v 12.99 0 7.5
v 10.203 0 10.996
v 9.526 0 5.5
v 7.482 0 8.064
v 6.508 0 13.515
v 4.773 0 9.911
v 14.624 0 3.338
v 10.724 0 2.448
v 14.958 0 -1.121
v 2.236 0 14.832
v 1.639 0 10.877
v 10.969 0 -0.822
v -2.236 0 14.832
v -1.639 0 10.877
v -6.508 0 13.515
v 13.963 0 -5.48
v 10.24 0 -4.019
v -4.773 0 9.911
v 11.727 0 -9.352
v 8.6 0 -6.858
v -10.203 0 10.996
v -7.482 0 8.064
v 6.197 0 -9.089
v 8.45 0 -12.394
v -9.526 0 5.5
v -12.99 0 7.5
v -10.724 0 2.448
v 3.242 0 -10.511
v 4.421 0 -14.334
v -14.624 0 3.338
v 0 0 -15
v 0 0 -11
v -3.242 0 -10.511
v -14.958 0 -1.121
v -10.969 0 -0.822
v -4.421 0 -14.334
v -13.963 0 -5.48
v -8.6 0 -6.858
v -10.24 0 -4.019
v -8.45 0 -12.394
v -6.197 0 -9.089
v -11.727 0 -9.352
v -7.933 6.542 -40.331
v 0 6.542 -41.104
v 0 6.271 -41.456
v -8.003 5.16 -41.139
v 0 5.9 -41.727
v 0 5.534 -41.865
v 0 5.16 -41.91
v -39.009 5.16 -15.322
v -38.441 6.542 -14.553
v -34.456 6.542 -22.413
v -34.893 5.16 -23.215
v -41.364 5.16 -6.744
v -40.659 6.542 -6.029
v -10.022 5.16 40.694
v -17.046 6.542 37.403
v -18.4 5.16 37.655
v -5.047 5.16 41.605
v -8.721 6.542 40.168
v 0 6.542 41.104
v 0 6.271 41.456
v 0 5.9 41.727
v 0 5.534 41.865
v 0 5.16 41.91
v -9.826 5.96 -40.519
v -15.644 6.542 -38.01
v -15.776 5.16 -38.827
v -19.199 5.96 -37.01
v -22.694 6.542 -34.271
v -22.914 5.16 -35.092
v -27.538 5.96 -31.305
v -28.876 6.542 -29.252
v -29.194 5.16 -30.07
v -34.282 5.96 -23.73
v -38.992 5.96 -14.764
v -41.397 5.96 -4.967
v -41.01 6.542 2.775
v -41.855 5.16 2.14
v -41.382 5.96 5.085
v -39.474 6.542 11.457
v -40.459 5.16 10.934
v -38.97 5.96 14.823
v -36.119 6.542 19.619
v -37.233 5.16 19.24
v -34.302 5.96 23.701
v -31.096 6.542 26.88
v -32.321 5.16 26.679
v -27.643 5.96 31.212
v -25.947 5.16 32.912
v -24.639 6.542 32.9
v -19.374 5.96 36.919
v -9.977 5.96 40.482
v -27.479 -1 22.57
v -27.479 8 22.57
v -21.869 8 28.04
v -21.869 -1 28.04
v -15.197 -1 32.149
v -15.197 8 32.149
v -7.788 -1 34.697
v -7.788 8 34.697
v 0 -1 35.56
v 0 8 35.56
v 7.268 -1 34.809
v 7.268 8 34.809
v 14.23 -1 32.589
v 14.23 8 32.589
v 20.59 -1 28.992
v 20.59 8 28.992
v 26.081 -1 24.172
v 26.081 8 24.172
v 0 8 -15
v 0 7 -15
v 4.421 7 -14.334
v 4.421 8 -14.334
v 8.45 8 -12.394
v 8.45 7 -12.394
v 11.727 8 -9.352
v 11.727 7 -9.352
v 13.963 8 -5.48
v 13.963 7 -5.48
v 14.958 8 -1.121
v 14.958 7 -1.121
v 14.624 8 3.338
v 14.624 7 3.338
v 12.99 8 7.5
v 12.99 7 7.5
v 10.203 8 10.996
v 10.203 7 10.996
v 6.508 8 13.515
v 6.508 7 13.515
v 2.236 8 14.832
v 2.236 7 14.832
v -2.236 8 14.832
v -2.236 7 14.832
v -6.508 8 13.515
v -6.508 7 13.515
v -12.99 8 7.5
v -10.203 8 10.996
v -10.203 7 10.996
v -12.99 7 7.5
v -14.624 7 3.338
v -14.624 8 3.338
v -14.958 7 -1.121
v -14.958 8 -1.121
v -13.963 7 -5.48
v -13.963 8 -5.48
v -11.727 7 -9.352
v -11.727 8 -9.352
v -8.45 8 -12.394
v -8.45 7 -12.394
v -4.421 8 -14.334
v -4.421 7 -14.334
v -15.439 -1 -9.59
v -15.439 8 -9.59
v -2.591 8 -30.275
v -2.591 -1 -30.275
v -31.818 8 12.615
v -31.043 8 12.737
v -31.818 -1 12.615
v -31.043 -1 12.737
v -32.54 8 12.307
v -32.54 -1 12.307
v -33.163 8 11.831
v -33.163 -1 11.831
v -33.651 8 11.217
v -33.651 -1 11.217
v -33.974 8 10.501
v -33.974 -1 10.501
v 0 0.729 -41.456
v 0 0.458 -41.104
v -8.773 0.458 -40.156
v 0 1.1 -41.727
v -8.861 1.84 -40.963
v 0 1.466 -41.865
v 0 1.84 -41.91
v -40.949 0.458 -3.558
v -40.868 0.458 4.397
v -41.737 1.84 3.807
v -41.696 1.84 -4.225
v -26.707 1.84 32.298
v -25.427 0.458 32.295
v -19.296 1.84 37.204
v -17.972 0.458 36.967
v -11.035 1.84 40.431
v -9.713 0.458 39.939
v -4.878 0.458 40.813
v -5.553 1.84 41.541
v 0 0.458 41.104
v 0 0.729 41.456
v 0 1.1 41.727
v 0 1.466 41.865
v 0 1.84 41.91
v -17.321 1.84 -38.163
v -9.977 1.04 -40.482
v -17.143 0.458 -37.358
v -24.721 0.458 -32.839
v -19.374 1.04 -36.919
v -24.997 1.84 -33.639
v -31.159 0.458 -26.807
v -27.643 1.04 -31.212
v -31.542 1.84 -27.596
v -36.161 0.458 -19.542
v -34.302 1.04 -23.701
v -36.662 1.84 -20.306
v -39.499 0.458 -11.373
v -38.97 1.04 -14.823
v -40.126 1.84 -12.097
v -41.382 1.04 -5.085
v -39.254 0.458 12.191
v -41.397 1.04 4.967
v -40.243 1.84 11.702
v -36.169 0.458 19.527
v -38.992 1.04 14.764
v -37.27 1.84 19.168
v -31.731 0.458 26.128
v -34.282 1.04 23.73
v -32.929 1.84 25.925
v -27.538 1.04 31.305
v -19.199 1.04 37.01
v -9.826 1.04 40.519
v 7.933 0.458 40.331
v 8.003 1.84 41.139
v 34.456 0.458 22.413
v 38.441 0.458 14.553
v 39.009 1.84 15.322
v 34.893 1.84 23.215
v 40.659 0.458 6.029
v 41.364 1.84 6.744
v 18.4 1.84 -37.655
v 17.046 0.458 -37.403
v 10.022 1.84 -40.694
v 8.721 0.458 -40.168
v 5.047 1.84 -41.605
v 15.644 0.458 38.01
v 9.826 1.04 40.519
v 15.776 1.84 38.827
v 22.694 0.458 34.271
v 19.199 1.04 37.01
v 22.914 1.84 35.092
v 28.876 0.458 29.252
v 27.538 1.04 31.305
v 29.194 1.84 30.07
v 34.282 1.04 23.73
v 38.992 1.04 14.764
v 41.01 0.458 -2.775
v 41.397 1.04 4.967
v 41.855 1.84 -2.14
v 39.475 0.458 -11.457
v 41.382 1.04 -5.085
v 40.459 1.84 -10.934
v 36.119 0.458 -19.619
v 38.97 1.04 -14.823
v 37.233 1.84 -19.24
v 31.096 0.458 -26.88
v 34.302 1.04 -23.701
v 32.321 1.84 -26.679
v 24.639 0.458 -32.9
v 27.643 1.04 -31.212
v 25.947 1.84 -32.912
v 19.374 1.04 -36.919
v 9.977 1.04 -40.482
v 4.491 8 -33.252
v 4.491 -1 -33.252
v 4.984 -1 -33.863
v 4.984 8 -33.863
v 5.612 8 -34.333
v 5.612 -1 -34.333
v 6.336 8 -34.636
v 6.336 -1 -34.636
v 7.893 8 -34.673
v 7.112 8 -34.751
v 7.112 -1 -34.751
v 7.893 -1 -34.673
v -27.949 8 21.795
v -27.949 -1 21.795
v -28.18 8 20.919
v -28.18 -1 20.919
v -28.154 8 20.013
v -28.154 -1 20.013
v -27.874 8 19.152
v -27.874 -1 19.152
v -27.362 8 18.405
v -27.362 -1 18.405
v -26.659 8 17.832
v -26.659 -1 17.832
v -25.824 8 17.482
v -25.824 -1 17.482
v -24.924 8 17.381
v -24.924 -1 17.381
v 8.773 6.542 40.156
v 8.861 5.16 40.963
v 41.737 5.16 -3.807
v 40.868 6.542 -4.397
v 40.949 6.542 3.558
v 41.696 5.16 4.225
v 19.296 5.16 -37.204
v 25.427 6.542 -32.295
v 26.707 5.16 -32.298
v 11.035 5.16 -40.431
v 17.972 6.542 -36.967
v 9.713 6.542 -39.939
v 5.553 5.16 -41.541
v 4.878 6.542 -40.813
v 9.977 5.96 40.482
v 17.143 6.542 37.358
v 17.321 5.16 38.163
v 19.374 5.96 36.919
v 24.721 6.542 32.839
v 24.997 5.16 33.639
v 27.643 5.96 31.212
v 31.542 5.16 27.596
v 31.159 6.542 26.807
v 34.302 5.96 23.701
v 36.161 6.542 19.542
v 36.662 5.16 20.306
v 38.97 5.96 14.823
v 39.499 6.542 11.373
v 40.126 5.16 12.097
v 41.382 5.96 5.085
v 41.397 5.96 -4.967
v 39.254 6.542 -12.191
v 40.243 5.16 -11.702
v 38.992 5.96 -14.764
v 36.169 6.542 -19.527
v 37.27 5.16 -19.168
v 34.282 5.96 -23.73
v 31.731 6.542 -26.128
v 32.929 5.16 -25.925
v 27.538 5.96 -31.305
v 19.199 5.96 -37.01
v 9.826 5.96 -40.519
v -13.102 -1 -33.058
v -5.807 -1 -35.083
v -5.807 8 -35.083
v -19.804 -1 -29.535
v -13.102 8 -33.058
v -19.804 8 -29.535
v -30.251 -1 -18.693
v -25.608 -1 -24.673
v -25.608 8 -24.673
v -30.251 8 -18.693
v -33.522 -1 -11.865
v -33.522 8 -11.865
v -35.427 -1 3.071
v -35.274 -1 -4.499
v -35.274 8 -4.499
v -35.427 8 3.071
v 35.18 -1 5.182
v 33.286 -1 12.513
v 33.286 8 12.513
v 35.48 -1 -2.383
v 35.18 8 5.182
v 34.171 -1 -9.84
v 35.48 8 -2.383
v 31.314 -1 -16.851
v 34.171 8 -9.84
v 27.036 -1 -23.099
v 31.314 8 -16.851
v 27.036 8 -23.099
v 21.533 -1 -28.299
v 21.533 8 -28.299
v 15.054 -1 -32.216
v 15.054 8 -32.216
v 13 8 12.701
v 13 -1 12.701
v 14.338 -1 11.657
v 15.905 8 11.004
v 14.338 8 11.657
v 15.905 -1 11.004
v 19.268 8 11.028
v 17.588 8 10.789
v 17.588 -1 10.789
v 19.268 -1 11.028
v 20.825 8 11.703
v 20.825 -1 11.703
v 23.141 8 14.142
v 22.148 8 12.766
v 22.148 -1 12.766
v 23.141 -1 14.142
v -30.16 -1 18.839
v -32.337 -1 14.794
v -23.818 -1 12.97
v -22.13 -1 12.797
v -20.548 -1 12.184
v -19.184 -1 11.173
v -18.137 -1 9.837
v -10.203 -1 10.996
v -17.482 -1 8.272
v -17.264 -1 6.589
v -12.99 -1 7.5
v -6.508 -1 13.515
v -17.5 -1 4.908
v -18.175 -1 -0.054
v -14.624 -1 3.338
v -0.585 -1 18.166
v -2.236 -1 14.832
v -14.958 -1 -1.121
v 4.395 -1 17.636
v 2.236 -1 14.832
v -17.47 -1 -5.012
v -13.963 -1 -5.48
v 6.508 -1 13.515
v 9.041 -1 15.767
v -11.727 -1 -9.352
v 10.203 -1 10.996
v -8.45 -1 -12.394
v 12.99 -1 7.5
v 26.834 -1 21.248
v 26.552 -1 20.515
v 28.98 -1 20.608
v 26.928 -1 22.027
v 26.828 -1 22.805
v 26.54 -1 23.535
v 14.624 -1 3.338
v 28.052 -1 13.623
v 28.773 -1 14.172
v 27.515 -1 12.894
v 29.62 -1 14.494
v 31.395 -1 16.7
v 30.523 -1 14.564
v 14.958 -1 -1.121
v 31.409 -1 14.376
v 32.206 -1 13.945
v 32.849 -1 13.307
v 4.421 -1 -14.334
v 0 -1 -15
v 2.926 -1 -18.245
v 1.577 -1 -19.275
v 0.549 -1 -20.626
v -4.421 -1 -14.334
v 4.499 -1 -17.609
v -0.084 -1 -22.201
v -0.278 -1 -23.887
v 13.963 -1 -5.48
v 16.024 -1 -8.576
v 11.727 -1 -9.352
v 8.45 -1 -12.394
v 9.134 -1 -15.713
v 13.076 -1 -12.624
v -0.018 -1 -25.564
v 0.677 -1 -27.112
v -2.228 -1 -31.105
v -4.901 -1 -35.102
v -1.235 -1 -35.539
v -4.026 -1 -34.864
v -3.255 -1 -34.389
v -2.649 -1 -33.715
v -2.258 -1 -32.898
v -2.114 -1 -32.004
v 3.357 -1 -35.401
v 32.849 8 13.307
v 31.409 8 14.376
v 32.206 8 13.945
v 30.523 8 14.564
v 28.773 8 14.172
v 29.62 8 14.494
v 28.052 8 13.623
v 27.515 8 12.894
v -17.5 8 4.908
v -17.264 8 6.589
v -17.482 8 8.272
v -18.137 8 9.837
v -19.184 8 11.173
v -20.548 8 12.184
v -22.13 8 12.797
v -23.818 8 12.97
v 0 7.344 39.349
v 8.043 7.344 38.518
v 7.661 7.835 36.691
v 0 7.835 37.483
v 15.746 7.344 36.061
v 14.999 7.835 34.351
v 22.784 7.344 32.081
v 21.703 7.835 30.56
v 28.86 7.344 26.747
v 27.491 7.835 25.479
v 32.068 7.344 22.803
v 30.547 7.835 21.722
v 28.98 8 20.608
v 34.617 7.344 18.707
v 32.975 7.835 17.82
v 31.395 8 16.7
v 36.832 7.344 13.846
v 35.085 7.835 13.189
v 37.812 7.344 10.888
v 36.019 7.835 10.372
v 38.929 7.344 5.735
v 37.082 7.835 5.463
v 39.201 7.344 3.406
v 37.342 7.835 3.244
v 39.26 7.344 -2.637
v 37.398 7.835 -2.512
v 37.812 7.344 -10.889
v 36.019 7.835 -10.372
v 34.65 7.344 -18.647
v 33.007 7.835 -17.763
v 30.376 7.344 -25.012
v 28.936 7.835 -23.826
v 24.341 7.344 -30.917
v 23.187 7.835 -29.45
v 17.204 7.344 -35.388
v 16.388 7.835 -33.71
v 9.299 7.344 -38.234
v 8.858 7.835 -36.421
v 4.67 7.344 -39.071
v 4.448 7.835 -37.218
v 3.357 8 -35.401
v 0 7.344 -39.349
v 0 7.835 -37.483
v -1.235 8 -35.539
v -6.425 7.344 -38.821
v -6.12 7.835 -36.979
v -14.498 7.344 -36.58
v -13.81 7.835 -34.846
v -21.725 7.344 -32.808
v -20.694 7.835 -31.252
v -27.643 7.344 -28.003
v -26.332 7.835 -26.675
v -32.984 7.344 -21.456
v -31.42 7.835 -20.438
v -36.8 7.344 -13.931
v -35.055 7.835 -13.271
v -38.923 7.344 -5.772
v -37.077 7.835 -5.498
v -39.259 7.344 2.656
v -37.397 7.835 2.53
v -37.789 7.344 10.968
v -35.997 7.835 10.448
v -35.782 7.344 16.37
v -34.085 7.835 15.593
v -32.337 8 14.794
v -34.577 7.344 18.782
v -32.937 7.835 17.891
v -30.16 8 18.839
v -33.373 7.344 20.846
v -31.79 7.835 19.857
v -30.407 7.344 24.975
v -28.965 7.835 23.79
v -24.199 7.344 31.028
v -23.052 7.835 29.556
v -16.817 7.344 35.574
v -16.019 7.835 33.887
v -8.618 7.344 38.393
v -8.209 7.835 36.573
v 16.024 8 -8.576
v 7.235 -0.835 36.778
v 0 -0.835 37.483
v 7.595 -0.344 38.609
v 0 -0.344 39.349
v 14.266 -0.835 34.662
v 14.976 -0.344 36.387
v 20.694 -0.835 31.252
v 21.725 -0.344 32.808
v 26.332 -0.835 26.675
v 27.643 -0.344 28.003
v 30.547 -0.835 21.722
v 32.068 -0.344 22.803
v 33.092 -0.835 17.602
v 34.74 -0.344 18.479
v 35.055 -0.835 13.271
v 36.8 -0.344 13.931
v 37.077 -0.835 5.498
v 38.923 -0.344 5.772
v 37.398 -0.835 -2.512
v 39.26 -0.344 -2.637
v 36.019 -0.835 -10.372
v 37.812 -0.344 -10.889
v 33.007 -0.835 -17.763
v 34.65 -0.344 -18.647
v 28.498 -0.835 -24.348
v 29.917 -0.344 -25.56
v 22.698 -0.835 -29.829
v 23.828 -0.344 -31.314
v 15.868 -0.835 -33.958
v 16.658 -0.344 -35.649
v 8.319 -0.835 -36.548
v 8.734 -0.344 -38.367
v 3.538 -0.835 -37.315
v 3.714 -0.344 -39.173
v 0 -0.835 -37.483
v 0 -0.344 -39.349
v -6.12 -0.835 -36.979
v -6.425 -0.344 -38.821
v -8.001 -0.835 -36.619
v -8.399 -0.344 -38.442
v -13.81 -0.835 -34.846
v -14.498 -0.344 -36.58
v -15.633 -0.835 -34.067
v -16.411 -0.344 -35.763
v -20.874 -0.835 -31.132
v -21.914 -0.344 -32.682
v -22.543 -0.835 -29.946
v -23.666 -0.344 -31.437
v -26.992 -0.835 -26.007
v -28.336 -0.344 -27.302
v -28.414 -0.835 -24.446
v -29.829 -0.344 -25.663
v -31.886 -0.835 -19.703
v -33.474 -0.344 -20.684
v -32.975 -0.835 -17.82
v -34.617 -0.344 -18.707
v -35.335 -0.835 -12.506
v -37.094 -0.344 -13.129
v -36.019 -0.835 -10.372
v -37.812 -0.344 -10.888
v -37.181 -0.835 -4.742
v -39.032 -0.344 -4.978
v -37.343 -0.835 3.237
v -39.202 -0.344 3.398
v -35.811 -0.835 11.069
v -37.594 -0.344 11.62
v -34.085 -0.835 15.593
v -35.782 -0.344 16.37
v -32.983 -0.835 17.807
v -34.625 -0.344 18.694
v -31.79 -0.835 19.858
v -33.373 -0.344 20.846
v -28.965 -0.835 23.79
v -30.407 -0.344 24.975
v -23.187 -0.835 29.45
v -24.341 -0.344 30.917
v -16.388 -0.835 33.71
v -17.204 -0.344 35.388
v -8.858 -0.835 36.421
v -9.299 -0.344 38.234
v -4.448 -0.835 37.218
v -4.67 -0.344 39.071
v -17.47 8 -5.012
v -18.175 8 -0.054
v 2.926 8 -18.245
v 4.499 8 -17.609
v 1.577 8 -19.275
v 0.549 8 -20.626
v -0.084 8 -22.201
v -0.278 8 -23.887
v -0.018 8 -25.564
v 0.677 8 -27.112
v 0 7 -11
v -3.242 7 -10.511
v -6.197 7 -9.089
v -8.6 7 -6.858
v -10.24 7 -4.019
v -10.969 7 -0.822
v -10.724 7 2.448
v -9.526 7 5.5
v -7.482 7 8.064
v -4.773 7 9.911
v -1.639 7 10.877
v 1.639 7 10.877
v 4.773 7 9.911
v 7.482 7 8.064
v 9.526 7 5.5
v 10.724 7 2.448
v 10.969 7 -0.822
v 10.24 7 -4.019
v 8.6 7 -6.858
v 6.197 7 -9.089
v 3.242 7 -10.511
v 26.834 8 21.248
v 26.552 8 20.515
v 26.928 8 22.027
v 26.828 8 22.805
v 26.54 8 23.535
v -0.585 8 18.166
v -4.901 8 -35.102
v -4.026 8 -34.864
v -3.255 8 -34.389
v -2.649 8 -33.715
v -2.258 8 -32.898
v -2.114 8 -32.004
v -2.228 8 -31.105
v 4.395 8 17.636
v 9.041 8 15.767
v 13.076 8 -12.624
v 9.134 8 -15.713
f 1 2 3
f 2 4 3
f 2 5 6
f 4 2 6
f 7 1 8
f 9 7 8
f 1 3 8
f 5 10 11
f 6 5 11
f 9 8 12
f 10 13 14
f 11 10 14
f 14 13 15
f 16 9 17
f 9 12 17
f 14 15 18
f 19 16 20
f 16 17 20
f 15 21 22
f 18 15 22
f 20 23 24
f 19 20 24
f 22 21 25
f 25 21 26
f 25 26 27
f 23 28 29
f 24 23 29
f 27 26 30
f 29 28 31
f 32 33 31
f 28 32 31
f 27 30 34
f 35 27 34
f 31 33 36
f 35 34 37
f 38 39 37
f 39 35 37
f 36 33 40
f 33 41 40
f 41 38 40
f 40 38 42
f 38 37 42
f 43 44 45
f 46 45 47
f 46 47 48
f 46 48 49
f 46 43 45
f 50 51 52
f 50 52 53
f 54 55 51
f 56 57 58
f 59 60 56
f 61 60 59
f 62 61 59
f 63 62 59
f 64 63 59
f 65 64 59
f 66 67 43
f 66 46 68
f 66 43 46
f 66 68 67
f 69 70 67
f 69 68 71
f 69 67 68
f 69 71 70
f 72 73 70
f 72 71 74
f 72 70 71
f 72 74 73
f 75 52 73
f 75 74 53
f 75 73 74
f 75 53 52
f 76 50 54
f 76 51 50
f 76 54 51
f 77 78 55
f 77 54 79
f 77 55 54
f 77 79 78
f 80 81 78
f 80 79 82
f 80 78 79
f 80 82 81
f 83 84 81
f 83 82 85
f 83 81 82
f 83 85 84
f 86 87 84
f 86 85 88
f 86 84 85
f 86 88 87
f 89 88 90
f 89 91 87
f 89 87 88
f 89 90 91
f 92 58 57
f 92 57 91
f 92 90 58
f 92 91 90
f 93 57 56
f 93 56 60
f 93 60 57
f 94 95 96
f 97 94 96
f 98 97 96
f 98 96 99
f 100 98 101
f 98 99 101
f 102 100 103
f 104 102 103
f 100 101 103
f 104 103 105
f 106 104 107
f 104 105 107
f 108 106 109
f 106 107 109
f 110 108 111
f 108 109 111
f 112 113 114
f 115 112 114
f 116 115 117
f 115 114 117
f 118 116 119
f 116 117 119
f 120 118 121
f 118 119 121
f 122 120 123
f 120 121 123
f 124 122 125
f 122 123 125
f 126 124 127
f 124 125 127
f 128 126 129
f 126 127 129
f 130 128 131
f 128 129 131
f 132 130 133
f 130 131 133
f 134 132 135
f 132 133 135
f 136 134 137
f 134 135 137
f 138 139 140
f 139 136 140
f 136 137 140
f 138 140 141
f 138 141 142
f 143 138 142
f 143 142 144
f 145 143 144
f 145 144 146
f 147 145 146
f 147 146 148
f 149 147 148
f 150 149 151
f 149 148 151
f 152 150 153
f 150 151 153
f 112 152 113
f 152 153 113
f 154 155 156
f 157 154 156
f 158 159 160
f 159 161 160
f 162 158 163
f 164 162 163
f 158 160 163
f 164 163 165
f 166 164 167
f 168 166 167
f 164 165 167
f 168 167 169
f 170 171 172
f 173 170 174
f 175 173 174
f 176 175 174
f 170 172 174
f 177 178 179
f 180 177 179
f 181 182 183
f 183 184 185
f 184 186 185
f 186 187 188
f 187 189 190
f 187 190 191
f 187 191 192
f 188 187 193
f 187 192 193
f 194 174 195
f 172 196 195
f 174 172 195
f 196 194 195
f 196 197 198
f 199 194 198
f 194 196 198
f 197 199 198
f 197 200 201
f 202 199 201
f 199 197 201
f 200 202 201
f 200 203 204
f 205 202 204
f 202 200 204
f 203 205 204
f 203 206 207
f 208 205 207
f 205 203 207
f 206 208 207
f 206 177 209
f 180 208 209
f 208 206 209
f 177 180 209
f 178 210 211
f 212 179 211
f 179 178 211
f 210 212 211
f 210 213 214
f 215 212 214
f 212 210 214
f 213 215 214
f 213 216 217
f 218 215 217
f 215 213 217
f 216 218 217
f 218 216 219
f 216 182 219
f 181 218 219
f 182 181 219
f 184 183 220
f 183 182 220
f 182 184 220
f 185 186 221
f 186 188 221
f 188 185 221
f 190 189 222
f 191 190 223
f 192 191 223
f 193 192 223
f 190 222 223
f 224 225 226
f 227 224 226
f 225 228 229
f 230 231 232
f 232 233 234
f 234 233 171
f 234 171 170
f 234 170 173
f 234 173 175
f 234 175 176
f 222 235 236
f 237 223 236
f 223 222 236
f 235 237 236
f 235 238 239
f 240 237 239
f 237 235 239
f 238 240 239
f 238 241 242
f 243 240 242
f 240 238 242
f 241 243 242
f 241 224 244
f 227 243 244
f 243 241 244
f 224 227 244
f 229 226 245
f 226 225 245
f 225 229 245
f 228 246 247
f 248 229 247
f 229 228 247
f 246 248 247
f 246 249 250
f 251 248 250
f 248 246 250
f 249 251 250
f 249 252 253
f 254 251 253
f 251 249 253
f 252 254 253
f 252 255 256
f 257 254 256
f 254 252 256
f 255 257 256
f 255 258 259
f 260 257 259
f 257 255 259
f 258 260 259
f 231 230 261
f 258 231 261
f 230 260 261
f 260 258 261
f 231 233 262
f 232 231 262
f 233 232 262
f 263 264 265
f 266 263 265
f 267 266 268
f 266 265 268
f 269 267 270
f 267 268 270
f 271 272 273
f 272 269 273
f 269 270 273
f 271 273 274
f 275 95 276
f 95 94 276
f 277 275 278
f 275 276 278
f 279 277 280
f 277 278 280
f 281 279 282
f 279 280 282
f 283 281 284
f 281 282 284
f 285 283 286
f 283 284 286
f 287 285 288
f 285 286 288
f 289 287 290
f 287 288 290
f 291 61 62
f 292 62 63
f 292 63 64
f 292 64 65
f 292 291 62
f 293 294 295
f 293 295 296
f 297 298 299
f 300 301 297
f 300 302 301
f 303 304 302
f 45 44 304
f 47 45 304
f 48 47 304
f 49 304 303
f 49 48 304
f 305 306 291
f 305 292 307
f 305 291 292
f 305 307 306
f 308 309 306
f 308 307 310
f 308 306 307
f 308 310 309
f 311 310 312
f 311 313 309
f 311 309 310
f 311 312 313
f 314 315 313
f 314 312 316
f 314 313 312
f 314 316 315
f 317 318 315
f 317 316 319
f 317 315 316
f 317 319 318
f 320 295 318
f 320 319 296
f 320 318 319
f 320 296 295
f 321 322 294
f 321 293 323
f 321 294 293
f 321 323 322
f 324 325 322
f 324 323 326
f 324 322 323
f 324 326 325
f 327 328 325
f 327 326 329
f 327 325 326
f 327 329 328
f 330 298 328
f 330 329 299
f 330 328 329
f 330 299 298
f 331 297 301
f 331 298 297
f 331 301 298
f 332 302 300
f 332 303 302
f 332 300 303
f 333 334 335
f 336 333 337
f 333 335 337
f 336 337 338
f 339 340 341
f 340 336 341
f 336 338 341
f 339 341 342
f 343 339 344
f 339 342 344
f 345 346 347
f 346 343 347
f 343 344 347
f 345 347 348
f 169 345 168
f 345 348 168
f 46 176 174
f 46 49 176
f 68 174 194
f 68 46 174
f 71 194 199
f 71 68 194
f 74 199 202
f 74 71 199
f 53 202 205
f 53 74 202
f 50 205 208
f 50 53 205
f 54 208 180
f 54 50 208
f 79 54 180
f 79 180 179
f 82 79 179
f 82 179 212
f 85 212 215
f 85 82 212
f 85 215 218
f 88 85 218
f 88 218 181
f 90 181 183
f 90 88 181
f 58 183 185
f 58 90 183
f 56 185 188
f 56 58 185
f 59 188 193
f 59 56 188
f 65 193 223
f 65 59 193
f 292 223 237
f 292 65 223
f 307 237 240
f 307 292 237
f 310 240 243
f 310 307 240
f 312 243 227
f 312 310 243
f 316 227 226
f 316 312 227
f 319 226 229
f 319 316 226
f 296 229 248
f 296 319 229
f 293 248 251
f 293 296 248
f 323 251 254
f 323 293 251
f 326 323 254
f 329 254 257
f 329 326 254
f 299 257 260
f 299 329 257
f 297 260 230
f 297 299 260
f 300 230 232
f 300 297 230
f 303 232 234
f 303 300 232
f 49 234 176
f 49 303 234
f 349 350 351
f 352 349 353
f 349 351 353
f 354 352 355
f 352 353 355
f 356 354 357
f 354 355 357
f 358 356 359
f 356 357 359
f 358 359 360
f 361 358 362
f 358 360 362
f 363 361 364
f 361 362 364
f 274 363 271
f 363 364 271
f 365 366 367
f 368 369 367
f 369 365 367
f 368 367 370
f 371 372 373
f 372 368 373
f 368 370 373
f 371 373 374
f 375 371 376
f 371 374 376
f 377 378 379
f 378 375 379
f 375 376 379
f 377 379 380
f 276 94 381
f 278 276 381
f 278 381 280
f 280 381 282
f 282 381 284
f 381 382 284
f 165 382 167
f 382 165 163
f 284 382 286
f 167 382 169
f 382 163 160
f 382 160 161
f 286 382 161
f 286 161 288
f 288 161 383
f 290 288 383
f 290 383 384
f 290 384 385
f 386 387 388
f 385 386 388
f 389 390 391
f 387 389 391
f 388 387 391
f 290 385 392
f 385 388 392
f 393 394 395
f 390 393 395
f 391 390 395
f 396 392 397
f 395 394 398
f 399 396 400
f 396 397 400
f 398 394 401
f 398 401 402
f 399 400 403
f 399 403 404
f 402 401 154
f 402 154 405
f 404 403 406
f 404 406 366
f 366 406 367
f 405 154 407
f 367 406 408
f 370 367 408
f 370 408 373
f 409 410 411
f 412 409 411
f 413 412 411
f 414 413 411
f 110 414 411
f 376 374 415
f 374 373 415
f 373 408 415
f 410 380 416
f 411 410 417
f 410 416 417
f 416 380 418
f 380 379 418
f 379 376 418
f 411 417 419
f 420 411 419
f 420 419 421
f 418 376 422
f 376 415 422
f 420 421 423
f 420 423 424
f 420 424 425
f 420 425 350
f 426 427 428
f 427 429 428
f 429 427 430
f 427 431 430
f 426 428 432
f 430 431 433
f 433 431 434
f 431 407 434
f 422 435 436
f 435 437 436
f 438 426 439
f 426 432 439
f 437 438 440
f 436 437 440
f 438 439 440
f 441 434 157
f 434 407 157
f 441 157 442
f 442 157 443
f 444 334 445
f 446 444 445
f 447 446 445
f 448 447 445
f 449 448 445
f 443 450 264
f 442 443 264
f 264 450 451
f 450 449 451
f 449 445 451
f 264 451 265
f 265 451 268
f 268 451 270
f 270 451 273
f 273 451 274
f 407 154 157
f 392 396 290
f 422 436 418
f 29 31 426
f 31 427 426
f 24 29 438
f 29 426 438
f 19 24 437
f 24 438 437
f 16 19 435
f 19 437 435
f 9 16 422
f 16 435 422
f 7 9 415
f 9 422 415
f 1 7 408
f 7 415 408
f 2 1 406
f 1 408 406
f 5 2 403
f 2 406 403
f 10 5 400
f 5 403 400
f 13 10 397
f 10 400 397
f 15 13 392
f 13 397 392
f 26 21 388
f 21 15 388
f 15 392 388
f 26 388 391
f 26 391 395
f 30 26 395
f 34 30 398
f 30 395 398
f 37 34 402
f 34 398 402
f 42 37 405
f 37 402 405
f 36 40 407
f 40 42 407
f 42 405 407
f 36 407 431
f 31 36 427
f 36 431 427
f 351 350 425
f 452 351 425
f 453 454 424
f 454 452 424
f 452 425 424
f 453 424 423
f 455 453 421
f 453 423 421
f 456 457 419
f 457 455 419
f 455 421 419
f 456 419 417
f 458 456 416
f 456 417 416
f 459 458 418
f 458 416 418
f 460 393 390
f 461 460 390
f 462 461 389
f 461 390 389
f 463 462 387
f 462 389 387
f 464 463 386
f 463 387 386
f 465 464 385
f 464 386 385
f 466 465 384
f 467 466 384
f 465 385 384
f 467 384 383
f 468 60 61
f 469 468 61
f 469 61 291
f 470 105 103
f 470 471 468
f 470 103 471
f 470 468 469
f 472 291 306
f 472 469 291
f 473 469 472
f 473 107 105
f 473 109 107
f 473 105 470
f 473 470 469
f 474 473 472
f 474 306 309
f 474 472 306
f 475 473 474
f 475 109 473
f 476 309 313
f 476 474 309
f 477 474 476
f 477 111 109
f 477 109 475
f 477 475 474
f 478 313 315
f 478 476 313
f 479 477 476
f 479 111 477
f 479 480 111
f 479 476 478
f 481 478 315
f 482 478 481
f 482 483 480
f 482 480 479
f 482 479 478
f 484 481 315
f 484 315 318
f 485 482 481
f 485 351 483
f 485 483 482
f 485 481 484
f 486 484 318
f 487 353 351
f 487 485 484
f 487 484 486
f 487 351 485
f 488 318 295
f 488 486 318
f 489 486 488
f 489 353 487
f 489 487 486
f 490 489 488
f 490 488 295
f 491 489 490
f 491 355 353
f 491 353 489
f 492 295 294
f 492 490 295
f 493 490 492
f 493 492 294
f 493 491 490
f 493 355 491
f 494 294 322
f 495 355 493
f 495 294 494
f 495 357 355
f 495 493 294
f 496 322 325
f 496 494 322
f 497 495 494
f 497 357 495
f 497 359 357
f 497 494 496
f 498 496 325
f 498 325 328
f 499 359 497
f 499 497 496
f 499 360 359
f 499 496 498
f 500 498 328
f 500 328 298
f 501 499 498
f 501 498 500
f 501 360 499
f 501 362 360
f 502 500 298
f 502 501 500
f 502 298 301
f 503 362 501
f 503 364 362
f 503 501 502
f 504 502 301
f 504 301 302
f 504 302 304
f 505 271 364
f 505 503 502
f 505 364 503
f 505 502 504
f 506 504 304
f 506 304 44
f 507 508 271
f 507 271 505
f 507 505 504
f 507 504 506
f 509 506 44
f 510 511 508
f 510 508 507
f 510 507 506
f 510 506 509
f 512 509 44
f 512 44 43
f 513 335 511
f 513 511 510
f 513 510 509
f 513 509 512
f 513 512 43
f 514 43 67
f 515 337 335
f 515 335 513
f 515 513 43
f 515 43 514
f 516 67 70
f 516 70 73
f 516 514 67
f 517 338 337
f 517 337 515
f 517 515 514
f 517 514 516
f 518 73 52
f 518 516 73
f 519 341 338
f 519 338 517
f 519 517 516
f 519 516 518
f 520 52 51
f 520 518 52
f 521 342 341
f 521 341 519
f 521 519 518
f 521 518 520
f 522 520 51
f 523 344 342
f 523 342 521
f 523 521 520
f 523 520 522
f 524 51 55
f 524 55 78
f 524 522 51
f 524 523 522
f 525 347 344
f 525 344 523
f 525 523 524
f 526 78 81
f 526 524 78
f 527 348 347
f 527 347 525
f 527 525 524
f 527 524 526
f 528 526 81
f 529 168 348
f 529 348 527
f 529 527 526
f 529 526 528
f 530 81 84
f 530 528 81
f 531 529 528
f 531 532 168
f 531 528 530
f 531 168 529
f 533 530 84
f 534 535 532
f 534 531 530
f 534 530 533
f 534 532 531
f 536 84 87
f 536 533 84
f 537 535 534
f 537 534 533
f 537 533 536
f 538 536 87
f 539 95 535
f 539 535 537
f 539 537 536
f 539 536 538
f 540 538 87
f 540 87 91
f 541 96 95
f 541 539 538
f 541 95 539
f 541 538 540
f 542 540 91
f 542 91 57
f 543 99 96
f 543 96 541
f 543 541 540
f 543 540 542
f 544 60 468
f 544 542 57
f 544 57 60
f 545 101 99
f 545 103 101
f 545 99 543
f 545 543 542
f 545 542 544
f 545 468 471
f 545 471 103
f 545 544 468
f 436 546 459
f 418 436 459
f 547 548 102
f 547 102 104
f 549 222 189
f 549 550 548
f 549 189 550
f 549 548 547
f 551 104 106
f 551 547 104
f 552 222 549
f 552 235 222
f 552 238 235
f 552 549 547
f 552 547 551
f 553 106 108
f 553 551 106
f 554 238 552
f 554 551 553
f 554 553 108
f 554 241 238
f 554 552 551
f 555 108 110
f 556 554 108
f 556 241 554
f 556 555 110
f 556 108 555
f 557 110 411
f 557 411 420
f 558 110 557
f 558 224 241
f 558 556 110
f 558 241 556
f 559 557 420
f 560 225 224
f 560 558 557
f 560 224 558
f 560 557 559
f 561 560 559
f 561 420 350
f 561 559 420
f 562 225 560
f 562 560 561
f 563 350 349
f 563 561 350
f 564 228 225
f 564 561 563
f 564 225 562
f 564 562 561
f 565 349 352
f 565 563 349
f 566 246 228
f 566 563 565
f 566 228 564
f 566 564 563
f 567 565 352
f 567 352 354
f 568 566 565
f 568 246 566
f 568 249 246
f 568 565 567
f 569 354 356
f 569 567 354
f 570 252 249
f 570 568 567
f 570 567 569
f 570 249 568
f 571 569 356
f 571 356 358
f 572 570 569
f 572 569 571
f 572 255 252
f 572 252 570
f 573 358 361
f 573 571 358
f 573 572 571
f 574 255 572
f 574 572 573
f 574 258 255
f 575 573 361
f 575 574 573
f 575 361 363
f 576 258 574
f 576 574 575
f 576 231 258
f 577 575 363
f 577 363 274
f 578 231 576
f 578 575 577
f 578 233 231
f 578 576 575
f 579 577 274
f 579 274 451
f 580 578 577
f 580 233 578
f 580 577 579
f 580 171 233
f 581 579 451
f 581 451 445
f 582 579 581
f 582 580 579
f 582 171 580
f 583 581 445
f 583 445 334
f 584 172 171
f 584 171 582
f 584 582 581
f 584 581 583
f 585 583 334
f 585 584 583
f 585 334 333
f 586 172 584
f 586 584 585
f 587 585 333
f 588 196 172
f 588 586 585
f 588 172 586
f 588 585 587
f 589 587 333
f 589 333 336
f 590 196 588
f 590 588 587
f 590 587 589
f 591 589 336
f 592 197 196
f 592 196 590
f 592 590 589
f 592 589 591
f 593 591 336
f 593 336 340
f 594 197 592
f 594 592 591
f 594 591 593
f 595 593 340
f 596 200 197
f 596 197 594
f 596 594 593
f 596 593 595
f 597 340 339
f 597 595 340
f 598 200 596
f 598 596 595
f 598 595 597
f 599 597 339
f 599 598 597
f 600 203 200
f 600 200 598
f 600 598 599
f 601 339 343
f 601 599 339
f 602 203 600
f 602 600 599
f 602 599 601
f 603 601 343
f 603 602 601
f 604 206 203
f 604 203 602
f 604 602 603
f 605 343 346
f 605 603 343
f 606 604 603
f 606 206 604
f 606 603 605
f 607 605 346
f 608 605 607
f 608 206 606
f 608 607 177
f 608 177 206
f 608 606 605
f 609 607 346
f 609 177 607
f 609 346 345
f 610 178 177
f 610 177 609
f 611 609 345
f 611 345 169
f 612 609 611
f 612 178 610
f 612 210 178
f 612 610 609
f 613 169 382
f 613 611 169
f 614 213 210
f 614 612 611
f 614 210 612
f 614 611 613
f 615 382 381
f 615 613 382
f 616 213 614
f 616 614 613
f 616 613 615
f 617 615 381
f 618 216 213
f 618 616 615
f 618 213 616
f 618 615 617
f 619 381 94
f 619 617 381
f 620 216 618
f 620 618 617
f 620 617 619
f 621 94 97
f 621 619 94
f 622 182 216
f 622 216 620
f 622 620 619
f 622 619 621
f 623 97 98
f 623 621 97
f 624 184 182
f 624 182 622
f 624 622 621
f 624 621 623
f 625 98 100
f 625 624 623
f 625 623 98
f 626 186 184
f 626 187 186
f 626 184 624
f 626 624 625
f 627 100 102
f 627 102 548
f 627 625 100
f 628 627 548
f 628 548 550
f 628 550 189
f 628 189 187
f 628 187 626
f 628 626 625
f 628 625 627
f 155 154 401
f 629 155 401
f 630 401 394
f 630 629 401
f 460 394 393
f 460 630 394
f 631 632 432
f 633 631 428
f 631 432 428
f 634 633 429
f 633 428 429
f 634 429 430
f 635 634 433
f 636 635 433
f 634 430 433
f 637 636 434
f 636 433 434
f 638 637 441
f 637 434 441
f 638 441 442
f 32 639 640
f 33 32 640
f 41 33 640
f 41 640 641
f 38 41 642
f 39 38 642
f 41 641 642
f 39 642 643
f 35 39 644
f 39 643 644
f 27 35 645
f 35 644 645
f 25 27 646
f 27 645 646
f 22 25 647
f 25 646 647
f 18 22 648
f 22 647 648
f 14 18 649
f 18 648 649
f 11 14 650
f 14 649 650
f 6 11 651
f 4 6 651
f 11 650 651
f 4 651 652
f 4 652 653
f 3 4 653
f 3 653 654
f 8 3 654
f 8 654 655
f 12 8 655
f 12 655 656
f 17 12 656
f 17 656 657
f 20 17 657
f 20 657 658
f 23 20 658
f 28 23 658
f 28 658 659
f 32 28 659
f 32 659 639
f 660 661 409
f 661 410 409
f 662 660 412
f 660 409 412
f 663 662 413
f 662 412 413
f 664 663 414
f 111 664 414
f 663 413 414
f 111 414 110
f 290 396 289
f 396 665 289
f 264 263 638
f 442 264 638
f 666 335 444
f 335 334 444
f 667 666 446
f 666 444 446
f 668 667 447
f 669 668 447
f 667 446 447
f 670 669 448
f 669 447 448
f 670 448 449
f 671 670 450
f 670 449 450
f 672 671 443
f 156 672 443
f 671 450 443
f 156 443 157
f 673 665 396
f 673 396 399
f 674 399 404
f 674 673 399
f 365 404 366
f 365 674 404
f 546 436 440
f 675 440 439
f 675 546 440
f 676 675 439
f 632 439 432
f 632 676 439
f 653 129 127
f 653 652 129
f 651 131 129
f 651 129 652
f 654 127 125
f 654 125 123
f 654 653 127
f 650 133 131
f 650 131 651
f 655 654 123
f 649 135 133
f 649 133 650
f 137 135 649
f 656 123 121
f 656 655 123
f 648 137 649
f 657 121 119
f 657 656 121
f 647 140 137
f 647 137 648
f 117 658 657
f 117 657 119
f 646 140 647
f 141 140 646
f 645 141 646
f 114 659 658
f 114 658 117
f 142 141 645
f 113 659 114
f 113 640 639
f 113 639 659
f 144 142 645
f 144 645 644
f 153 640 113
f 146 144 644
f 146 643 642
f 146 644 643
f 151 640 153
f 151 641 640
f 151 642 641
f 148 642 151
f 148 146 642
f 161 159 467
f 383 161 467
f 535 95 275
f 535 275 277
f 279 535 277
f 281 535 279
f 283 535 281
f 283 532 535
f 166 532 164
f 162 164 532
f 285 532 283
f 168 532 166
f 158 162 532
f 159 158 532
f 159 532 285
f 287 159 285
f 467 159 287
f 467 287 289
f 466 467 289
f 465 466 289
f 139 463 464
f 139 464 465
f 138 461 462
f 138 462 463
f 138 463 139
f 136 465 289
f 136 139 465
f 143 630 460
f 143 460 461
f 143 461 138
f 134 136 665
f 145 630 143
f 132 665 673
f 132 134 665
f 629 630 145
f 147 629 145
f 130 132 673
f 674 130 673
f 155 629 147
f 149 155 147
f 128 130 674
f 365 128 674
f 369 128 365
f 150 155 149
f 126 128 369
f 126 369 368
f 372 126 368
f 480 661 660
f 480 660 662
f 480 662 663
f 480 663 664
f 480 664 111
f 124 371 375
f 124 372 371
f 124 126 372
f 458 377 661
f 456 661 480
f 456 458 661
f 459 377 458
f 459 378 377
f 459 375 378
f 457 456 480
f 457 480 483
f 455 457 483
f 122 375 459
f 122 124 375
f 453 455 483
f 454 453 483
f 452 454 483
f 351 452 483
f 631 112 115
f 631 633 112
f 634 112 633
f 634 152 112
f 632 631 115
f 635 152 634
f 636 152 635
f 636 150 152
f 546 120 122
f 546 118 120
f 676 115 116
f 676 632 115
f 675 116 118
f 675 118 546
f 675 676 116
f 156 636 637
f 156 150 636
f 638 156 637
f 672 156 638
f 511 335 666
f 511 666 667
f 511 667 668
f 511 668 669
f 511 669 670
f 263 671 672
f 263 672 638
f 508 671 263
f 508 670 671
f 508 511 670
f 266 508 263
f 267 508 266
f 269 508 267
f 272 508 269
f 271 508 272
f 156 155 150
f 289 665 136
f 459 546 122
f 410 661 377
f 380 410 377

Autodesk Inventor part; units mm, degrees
ref_plane "YZ Plane" through (0, 0, 0) normal (1, 0, 0) x (0, 1, 0)
sketch "Sketch3" plane through (0, 0, 0) normal (1, 0, 0) x (0, 1, 0)
  line L0 (0, 0) -> (0, -11) construction
  line L1 (0, 0) -> (7, 0) construction
  line L2 (7, 0) -> (7, -11) construction
  line L3 (0, -11) -> (0, -41.91)
  line L4 (0, -41.91) -> (-1.9706, -41.91) construction
  line L5 (0, -11) -> (7, -11)
  line L6 (7, -11) -> (7, -41.91)
  line L7 (0, -41.91) -> (0, -39.6842) construction
  line L8 (0, -41.91) -> (7, -41.91)
  dimension "d7" = 7
  dimension "d8" = 11
  dimension "d9" = 41.91
revolve "Revolution1" add sketch "Sketch3" angle 360 about axis through (0, 0, 0) along (0, 1, 0)
ref_plane "Work Plane2" through (0, 0, 0) normal (-1, 0, 0) x (0, 1, 0)
sketch "Sketch4" plane through (0, 0, 0) normal (-1, 0, 0) x (0, 1, 0)
  line L0 (0, 0) -> (7, 0)
  line L1 (7, 41.91) -> (7, -41.91) projected
  line L2 (7, 0) -> (7, 11)
  line L3 (7, 0) -> (8, 0)
  line L4 (8, 0) -> (8, 15)
  line L5 (8, 15) -> (7, 15)
  line L6 (8, 15) -> (8, 41.91)
  line L7 (8, 41.91) -> (7, 41.91)
  line L8 (0, 0) -> (0, 0.75)
  line L9 (0, 11) -> (0, -11) projected
  line L10 (8, 15) -> (0, 15)
  line L11 (0, 41.91) -> (0, -41.91) projected
  line L12 (0, 15) -> (-1, 15)
  line L13 (-1, 15) -> (-1, 41.91)
  line L14 (-1, 41.91) -> (0, 41.91)
  dimension "d16" = 11
  dimension "d17" = 1
  dimension "d18" = 15
  dimension "d20" = 0.75
  dimension "d21" = 1
ref_plane "Work Plane3" through (0, 3.5, 0) normal (0, 1, 0) x (1, 0, 0)
revolve "Revolution2" add sketch "Sketch4" angle 360 about axis through (0, 0, 0) along (0, 1, 0) contours L12 L13 L14 L11 | L1 L7 L6 L5
sketch "Sketch5" plane through (0, 8, 0) normal (0, 1, 0) x (1, 0, 0)
  circle A0 centre (0, 0) radius 18.175
  circle A1 centre (0, 0) radius 15 projected
  circle A2 centre (0, 0) radius 41.91 projected
  circle A3 centre (0, 0) radius 35.56
  dimension "d22" = 3.175
  dimension "d23" = 6.35
extrude "Extrusion2" cut sketch "Sketch5" against normal through all contours A3
sketch "Sketch6" plane through (0, 8, 0) normal (0, 1, 0) x (1, 0, 0)
  circle A0 centre (0, 0) radius 18.175 projected
  circle A1 centre (0, 0) radius 35.56 projected
  line L0 (16.0245, 8.5759) -> (30.4464, -18.372)
  line L1 (27.5834, -22.4426) -> (17.7246, -4.0211)
  dimension "d26" = 4.445
extrude "Extrusion3" add sketch "Sketch6" against normal up to surface (9 mm away) contours A0 L0 A1 L1 picked at (22.1844, -5.1361)
pattern_circular "Circular Pattern1" count 3 over 360 about axis through (0, 3.5, 0) along (0, -1, 0) of "Extrusion3"
fillet "Fillet1" radius 6.35 3 edges at (-5.3799, 3.5, -17.3605) (17.7246, 3.5, 4.0211) (-12.3447, 3.5, 13.3394)
fillet "Fillet1" radius 3.175 3 edges at (27.5834, 3.5, 22.4426) (-33.2276, 3.5, 12.6666) (5.6442, 3.5, -35.1092)
fillet "Fillet1" radius 3.175 3 edges at (0.6874, 3.5, -35.5534) (-31.1338, 3.5, 17.1814) (30.4464, 3.5, 18.372)
sketch "Sketch7" plane through (0, 0, 0) normal (-1, 0, 0) x (0, 1, 0)
  line L0 (8, -41.91) -> (8, 41.91) projected
  line L1 (-1, -41.91) -> (-1, 41.91) projected
  line L2 (8, -41.91) -> (-1, -41.91) projected
  arc A0 (6.04, -41.91) -> (8, -35.56) centre (-3.2664, -35.56) ccw
  arc A1 (-1, -35.56) -> (0.96, -41.91) centre (10.2664, -35.56) ccw
  line L3 (0.96, -41.91) -> (6.04, -41.91)
  line L4 (-1, -35.56) -> (8, -35.56)
  line L5 (8, -22.57) -> (-1, -22.57) projected
  line L6 (8, -24.1718) -> (8, -35.56) projected
  line L7 (-1, -24.1718) -> (8, -24.1718) projected
  line L8 (-1, -22.57) -> (-1, -24.1718) projected
  line L9 (8, -35.56) -> (8, -35.56) projected
  line L10 (0, 0) -> (11.7377, 0)
  dimension "d36" = 6.35
  dimension "d37" = 5.08
revolve "Revolution3" cut sketch "Sketch7" angle 360 about axis through (0, 0, 0) along (0, 1, 0) contours L2 A0 L0 | A1 L2 L1
fillet "Fillet2" radius 1.5875 4 edges at (41.91, 6.04, 0) (-41.91, 6.04, 0) (-41.91, 0.96, 0) (41.91, 0.96, 0)
sketch "Sketch8" plane through (27.5145, 8, 12.8937) normal (0, 1, 0) x (0.8817, 0, -0.4719)
  circle A0 centre (-18.175, 24.3509) radius 19.05
  arc A1 (-27.2625, 8.6109) -> (-12.7058, 7.0183) centre (-18.175, 24.3509) ccw projected
  dimension "d40" = 38.1
properties part number "Spinner 1"
